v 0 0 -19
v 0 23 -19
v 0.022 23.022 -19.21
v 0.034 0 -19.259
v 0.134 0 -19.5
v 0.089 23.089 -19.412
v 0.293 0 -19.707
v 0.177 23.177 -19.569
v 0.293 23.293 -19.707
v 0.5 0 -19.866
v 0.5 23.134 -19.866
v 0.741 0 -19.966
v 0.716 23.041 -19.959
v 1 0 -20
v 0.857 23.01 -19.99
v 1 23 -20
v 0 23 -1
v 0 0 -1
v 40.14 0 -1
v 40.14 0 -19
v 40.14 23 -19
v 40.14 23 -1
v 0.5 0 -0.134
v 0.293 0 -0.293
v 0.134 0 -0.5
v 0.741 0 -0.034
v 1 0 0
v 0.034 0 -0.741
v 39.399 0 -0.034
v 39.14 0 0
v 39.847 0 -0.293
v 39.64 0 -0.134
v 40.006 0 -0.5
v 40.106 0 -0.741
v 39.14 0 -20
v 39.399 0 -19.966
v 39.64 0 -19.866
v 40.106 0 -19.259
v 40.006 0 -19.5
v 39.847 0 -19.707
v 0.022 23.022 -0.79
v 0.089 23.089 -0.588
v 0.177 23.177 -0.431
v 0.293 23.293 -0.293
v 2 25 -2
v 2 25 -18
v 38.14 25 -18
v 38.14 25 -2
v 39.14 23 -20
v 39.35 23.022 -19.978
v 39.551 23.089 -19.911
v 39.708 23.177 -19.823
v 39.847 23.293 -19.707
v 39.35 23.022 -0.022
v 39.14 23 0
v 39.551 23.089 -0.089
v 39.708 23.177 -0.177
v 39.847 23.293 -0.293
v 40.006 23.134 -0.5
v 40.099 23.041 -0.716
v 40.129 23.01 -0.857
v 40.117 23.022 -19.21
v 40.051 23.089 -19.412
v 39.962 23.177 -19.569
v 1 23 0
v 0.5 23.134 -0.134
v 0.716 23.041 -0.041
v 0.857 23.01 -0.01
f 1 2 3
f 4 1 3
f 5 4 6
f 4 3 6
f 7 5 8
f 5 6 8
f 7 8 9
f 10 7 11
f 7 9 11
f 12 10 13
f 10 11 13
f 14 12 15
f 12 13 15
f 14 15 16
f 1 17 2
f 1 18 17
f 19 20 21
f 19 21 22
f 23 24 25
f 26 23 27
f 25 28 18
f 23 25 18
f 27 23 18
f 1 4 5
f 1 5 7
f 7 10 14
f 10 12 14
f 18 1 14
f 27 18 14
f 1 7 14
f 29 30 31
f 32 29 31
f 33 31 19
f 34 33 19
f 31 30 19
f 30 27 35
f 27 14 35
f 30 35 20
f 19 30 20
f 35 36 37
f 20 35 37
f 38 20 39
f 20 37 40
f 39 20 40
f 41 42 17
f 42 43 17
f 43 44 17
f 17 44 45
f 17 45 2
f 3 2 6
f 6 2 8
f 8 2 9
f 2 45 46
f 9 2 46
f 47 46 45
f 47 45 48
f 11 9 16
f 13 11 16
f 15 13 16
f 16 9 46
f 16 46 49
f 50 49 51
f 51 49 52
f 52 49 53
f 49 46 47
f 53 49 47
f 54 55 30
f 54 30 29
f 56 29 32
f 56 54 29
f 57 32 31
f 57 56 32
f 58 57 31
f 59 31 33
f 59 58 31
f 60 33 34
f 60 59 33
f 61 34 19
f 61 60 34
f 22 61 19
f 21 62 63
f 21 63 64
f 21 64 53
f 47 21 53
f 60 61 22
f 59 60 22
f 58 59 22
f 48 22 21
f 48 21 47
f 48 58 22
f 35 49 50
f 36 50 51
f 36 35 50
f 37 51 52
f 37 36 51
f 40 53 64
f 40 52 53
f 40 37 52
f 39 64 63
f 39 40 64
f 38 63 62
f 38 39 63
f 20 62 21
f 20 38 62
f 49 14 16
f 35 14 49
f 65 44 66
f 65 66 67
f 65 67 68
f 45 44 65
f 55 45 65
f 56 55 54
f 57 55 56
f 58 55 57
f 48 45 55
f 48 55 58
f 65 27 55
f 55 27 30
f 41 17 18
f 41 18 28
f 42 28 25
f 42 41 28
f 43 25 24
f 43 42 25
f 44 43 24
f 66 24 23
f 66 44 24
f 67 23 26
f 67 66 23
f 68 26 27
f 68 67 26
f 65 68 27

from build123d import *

# Parameters (mm, degrees)
SKETCH1_W           = 52
SKETCH1_H           = 20
BOSS_EXTRUDE1_DEPTH = 25
CHAMFER1_SIZE       = 2
FILLET1_R           = 1
SKETCH2_W           = 11.974527316
SKETCH2_H           = 20.695057274
CUT_EXTRUDE1_DEPTH  = 40
FILLET2_R           = 1
CHAMFER5_SIZE       = 2


with BuildPart() as part:
    # Sketch1 → Boss-Extrude1 (new body)
    with BuildSketch(Plane(origin=(0, 0, 0), x_dir=(1, 0, 0), z_dir=(0, 1, 0))):
        with Locations((26, 10)):
            Rectangle(SKETCH1_W, SKETCH1_H)
    extrude(amount=BOSS_EXTRUDE1_DEPTH)

    # Chamfer1
    chamfer1_edges = [part.edges().sort_by_distance(p)[0] for p in [
        (52, 25, -10),
        (26, 25, -20),
        (0, 25, -10),
        (26, 25, 0),
    ]]
    chamfer(chamfer1_edges, length=CHAMFER1_SIZE)

    # Fillet1
    fillet1_edges = [part.edges().sort_by_distance(p)[0] for p in [
        (0, 11.5, -20),
        (52, 11.5, -20),
        (52, 11.5, 0),
        (0, 11.5, 0),
    ]]
    fillet(fillet1_edges, radius=FILLET1_R)

    # Sketch2 → Cut-Extrude1 (cut)
    with BuildSketch(Plane.XZ):
        with Locations((46.127047968, -10.347528637)):
            Rectangle(SKETCH2_W, SKETCH2_H)
    extrude(amount=-CUT_EXTRUDE1_DEPTH, mode=Mode.SUBTRACT)

    # Fillet2
    fillet2_edges = [part.edges().sort_by_distance(p)[0] for p in [
        (40.13978431, 11.5, -20),
        (40.13978431, 11.5, 0),
    ]]
    fillet(fillet2_edges, radius=FILLET2_R)

    # Chamfer5
    # the kernel refuses this chamfer: 2 mm, written as the material it takes off along each edge
    with BuildSketch(Plane(origin=(40.13978431, 25, 3.143365976), x_dir=(0.027495876610585647, -0.9996219169112968, 0), z_dir=(0, 0, -1))) as chamfer5_piece_1:
        Polygon((CHAMFER5_SIZE * 0.999621916911, CHAMFER5_SIZE * 0.0274958766106), (-CHAMFER5_SIZE * 0.0274958766106, CHAMFER5_SIZE * 0.999621916911), (0, 0), align=None)
    extrude(amount=26.286731952, mode=Mode.SUBTRACT)


solid = part.part
